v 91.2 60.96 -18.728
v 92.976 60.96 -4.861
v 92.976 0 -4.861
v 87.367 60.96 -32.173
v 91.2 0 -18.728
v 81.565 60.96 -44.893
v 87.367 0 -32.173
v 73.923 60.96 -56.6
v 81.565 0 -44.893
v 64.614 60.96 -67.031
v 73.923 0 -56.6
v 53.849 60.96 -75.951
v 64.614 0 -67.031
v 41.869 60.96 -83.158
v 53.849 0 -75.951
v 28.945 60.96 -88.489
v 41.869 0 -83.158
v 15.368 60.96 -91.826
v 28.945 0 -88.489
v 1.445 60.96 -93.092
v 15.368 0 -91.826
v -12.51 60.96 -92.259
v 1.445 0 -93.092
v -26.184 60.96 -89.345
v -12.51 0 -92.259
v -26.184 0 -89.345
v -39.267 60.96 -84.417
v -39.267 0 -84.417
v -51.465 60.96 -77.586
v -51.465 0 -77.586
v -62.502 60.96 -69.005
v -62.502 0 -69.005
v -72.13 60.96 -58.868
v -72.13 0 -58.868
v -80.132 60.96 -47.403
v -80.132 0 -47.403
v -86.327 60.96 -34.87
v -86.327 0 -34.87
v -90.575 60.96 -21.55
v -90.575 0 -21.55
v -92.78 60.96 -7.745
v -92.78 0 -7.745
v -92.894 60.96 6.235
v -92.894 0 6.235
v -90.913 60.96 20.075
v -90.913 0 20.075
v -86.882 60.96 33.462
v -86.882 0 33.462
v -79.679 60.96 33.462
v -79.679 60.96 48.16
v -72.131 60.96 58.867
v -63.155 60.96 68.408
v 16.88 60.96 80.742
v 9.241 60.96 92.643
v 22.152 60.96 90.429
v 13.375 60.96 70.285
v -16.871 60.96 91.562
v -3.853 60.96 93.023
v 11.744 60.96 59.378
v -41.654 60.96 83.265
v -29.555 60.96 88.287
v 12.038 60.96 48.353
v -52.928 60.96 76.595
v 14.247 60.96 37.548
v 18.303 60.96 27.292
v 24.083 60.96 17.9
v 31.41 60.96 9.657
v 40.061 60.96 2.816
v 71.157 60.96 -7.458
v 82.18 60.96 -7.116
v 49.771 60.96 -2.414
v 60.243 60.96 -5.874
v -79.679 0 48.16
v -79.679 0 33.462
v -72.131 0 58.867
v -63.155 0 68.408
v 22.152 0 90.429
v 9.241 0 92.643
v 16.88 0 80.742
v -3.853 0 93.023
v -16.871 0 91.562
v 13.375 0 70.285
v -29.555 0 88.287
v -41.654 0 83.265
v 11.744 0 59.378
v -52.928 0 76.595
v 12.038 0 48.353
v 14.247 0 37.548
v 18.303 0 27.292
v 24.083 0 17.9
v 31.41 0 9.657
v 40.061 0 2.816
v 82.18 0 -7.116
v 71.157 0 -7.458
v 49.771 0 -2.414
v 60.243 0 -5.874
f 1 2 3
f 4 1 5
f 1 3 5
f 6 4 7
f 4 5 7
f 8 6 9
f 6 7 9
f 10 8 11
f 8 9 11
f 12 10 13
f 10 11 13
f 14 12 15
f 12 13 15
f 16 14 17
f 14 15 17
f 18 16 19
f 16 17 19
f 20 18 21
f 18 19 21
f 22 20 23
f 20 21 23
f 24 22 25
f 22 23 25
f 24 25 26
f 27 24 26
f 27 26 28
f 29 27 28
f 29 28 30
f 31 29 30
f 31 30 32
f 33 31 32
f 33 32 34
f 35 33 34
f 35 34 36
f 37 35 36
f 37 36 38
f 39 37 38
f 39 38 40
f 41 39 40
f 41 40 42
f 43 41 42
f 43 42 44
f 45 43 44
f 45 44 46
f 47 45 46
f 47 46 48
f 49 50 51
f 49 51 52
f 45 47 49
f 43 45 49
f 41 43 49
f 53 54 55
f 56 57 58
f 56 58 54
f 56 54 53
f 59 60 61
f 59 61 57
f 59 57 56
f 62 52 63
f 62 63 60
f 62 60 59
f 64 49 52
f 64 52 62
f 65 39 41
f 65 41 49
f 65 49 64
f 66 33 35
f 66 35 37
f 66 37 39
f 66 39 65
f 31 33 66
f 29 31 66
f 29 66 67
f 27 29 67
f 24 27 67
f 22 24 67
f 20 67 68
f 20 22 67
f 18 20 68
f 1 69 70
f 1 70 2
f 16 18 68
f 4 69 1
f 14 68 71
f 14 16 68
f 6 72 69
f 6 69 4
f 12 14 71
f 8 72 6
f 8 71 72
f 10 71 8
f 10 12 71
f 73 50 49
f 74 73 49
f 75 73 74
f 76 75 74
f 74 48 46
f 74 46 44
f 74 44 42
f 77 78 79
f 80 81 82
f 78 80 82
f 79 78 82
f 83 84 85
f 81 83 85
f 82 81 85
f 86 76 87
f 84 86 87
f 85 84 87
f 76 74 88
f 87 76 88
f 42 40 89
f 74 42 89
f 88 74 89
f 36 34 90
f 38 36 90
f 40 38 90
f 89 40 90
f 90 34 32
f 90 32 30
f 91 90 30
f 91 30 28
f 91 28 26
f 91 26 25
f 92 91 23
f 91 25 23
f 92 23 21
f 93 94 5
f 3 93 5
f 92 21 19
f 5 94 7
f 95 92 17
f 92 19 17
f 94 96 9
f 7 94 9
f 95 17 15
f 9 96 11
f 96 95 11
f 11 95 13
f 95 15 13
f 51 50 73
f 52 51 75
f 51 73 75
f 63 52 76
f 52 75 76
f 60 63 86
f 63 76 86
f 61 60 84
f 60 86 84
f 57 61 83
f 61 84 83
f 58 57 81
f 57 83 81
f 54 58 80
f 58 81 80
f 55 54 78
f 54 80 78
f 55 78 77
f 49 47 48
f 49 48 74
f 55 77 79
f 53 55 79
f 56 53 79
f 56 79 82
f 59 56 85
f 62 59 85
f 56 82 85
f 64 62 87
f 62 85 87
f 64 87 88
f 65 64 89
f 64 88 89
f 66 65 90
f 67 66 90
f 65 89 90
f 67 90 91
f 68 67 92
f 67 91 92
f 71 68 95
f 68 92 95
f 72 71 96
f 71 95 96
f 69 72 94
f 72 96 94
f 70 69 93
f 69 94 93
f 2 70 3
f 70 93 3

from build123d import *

# Parameters (mm, degrees)
BOSS_EXTRUDE1_DEPTH = 60.96
CUT_EXTRUDE1_REACH  = 147.095
SKETCH3_W           = 40.961637843
SKETCH3_H           = 33.750081885


with BuildPart() as part:
    # Sketch1 → Boss-Extrude1 (new body)
    with BuildSketch(Plane(origin=(0, 0, 0), x_dir=(1, 0, 0), z_dir=(0, 1, 0))):
        with BuildLine():
            ThreePointArc((92.976117224, 4.860881604), (-74.724124634, 55.538200742), (22.152321734, -90.429315965))
            ThreePointArc((22.152321734, -90.429315965), (24.083056487, -17.899569011), (92.976117224, 4.860881604))
        make_face()
    extrude(amount=BOSS_EXTRUDE1_DEPTH)

    # Sketch3 → Cut-Extrude1 (cut, up to next)
    with BuildSketch(Plane(origin=(0, 60.96, 0), x_dir=(1, 0, 0), z_dir=(0, 1, 0)), mode=Mode.PRIVATE) as cut_extrude1_sk1:
        with Locations((-100.15988625, -50.336660589)):
            Rectangle(SKETCH3_W, SKETCH3_H)
    cut_extrude1_tool1 = extrude(cut_extrude1_sk1.sketch, amount=-CUT_EXTRUDE1_REACH, mode=Mode.PRIVATE) & part.part
    add(cut_extrude1_tool1.solids().sort_by_distance((-100.159886, 60.96, 50.336661))[0], mode=Mode.SUBTRACT)


solid = part.part
